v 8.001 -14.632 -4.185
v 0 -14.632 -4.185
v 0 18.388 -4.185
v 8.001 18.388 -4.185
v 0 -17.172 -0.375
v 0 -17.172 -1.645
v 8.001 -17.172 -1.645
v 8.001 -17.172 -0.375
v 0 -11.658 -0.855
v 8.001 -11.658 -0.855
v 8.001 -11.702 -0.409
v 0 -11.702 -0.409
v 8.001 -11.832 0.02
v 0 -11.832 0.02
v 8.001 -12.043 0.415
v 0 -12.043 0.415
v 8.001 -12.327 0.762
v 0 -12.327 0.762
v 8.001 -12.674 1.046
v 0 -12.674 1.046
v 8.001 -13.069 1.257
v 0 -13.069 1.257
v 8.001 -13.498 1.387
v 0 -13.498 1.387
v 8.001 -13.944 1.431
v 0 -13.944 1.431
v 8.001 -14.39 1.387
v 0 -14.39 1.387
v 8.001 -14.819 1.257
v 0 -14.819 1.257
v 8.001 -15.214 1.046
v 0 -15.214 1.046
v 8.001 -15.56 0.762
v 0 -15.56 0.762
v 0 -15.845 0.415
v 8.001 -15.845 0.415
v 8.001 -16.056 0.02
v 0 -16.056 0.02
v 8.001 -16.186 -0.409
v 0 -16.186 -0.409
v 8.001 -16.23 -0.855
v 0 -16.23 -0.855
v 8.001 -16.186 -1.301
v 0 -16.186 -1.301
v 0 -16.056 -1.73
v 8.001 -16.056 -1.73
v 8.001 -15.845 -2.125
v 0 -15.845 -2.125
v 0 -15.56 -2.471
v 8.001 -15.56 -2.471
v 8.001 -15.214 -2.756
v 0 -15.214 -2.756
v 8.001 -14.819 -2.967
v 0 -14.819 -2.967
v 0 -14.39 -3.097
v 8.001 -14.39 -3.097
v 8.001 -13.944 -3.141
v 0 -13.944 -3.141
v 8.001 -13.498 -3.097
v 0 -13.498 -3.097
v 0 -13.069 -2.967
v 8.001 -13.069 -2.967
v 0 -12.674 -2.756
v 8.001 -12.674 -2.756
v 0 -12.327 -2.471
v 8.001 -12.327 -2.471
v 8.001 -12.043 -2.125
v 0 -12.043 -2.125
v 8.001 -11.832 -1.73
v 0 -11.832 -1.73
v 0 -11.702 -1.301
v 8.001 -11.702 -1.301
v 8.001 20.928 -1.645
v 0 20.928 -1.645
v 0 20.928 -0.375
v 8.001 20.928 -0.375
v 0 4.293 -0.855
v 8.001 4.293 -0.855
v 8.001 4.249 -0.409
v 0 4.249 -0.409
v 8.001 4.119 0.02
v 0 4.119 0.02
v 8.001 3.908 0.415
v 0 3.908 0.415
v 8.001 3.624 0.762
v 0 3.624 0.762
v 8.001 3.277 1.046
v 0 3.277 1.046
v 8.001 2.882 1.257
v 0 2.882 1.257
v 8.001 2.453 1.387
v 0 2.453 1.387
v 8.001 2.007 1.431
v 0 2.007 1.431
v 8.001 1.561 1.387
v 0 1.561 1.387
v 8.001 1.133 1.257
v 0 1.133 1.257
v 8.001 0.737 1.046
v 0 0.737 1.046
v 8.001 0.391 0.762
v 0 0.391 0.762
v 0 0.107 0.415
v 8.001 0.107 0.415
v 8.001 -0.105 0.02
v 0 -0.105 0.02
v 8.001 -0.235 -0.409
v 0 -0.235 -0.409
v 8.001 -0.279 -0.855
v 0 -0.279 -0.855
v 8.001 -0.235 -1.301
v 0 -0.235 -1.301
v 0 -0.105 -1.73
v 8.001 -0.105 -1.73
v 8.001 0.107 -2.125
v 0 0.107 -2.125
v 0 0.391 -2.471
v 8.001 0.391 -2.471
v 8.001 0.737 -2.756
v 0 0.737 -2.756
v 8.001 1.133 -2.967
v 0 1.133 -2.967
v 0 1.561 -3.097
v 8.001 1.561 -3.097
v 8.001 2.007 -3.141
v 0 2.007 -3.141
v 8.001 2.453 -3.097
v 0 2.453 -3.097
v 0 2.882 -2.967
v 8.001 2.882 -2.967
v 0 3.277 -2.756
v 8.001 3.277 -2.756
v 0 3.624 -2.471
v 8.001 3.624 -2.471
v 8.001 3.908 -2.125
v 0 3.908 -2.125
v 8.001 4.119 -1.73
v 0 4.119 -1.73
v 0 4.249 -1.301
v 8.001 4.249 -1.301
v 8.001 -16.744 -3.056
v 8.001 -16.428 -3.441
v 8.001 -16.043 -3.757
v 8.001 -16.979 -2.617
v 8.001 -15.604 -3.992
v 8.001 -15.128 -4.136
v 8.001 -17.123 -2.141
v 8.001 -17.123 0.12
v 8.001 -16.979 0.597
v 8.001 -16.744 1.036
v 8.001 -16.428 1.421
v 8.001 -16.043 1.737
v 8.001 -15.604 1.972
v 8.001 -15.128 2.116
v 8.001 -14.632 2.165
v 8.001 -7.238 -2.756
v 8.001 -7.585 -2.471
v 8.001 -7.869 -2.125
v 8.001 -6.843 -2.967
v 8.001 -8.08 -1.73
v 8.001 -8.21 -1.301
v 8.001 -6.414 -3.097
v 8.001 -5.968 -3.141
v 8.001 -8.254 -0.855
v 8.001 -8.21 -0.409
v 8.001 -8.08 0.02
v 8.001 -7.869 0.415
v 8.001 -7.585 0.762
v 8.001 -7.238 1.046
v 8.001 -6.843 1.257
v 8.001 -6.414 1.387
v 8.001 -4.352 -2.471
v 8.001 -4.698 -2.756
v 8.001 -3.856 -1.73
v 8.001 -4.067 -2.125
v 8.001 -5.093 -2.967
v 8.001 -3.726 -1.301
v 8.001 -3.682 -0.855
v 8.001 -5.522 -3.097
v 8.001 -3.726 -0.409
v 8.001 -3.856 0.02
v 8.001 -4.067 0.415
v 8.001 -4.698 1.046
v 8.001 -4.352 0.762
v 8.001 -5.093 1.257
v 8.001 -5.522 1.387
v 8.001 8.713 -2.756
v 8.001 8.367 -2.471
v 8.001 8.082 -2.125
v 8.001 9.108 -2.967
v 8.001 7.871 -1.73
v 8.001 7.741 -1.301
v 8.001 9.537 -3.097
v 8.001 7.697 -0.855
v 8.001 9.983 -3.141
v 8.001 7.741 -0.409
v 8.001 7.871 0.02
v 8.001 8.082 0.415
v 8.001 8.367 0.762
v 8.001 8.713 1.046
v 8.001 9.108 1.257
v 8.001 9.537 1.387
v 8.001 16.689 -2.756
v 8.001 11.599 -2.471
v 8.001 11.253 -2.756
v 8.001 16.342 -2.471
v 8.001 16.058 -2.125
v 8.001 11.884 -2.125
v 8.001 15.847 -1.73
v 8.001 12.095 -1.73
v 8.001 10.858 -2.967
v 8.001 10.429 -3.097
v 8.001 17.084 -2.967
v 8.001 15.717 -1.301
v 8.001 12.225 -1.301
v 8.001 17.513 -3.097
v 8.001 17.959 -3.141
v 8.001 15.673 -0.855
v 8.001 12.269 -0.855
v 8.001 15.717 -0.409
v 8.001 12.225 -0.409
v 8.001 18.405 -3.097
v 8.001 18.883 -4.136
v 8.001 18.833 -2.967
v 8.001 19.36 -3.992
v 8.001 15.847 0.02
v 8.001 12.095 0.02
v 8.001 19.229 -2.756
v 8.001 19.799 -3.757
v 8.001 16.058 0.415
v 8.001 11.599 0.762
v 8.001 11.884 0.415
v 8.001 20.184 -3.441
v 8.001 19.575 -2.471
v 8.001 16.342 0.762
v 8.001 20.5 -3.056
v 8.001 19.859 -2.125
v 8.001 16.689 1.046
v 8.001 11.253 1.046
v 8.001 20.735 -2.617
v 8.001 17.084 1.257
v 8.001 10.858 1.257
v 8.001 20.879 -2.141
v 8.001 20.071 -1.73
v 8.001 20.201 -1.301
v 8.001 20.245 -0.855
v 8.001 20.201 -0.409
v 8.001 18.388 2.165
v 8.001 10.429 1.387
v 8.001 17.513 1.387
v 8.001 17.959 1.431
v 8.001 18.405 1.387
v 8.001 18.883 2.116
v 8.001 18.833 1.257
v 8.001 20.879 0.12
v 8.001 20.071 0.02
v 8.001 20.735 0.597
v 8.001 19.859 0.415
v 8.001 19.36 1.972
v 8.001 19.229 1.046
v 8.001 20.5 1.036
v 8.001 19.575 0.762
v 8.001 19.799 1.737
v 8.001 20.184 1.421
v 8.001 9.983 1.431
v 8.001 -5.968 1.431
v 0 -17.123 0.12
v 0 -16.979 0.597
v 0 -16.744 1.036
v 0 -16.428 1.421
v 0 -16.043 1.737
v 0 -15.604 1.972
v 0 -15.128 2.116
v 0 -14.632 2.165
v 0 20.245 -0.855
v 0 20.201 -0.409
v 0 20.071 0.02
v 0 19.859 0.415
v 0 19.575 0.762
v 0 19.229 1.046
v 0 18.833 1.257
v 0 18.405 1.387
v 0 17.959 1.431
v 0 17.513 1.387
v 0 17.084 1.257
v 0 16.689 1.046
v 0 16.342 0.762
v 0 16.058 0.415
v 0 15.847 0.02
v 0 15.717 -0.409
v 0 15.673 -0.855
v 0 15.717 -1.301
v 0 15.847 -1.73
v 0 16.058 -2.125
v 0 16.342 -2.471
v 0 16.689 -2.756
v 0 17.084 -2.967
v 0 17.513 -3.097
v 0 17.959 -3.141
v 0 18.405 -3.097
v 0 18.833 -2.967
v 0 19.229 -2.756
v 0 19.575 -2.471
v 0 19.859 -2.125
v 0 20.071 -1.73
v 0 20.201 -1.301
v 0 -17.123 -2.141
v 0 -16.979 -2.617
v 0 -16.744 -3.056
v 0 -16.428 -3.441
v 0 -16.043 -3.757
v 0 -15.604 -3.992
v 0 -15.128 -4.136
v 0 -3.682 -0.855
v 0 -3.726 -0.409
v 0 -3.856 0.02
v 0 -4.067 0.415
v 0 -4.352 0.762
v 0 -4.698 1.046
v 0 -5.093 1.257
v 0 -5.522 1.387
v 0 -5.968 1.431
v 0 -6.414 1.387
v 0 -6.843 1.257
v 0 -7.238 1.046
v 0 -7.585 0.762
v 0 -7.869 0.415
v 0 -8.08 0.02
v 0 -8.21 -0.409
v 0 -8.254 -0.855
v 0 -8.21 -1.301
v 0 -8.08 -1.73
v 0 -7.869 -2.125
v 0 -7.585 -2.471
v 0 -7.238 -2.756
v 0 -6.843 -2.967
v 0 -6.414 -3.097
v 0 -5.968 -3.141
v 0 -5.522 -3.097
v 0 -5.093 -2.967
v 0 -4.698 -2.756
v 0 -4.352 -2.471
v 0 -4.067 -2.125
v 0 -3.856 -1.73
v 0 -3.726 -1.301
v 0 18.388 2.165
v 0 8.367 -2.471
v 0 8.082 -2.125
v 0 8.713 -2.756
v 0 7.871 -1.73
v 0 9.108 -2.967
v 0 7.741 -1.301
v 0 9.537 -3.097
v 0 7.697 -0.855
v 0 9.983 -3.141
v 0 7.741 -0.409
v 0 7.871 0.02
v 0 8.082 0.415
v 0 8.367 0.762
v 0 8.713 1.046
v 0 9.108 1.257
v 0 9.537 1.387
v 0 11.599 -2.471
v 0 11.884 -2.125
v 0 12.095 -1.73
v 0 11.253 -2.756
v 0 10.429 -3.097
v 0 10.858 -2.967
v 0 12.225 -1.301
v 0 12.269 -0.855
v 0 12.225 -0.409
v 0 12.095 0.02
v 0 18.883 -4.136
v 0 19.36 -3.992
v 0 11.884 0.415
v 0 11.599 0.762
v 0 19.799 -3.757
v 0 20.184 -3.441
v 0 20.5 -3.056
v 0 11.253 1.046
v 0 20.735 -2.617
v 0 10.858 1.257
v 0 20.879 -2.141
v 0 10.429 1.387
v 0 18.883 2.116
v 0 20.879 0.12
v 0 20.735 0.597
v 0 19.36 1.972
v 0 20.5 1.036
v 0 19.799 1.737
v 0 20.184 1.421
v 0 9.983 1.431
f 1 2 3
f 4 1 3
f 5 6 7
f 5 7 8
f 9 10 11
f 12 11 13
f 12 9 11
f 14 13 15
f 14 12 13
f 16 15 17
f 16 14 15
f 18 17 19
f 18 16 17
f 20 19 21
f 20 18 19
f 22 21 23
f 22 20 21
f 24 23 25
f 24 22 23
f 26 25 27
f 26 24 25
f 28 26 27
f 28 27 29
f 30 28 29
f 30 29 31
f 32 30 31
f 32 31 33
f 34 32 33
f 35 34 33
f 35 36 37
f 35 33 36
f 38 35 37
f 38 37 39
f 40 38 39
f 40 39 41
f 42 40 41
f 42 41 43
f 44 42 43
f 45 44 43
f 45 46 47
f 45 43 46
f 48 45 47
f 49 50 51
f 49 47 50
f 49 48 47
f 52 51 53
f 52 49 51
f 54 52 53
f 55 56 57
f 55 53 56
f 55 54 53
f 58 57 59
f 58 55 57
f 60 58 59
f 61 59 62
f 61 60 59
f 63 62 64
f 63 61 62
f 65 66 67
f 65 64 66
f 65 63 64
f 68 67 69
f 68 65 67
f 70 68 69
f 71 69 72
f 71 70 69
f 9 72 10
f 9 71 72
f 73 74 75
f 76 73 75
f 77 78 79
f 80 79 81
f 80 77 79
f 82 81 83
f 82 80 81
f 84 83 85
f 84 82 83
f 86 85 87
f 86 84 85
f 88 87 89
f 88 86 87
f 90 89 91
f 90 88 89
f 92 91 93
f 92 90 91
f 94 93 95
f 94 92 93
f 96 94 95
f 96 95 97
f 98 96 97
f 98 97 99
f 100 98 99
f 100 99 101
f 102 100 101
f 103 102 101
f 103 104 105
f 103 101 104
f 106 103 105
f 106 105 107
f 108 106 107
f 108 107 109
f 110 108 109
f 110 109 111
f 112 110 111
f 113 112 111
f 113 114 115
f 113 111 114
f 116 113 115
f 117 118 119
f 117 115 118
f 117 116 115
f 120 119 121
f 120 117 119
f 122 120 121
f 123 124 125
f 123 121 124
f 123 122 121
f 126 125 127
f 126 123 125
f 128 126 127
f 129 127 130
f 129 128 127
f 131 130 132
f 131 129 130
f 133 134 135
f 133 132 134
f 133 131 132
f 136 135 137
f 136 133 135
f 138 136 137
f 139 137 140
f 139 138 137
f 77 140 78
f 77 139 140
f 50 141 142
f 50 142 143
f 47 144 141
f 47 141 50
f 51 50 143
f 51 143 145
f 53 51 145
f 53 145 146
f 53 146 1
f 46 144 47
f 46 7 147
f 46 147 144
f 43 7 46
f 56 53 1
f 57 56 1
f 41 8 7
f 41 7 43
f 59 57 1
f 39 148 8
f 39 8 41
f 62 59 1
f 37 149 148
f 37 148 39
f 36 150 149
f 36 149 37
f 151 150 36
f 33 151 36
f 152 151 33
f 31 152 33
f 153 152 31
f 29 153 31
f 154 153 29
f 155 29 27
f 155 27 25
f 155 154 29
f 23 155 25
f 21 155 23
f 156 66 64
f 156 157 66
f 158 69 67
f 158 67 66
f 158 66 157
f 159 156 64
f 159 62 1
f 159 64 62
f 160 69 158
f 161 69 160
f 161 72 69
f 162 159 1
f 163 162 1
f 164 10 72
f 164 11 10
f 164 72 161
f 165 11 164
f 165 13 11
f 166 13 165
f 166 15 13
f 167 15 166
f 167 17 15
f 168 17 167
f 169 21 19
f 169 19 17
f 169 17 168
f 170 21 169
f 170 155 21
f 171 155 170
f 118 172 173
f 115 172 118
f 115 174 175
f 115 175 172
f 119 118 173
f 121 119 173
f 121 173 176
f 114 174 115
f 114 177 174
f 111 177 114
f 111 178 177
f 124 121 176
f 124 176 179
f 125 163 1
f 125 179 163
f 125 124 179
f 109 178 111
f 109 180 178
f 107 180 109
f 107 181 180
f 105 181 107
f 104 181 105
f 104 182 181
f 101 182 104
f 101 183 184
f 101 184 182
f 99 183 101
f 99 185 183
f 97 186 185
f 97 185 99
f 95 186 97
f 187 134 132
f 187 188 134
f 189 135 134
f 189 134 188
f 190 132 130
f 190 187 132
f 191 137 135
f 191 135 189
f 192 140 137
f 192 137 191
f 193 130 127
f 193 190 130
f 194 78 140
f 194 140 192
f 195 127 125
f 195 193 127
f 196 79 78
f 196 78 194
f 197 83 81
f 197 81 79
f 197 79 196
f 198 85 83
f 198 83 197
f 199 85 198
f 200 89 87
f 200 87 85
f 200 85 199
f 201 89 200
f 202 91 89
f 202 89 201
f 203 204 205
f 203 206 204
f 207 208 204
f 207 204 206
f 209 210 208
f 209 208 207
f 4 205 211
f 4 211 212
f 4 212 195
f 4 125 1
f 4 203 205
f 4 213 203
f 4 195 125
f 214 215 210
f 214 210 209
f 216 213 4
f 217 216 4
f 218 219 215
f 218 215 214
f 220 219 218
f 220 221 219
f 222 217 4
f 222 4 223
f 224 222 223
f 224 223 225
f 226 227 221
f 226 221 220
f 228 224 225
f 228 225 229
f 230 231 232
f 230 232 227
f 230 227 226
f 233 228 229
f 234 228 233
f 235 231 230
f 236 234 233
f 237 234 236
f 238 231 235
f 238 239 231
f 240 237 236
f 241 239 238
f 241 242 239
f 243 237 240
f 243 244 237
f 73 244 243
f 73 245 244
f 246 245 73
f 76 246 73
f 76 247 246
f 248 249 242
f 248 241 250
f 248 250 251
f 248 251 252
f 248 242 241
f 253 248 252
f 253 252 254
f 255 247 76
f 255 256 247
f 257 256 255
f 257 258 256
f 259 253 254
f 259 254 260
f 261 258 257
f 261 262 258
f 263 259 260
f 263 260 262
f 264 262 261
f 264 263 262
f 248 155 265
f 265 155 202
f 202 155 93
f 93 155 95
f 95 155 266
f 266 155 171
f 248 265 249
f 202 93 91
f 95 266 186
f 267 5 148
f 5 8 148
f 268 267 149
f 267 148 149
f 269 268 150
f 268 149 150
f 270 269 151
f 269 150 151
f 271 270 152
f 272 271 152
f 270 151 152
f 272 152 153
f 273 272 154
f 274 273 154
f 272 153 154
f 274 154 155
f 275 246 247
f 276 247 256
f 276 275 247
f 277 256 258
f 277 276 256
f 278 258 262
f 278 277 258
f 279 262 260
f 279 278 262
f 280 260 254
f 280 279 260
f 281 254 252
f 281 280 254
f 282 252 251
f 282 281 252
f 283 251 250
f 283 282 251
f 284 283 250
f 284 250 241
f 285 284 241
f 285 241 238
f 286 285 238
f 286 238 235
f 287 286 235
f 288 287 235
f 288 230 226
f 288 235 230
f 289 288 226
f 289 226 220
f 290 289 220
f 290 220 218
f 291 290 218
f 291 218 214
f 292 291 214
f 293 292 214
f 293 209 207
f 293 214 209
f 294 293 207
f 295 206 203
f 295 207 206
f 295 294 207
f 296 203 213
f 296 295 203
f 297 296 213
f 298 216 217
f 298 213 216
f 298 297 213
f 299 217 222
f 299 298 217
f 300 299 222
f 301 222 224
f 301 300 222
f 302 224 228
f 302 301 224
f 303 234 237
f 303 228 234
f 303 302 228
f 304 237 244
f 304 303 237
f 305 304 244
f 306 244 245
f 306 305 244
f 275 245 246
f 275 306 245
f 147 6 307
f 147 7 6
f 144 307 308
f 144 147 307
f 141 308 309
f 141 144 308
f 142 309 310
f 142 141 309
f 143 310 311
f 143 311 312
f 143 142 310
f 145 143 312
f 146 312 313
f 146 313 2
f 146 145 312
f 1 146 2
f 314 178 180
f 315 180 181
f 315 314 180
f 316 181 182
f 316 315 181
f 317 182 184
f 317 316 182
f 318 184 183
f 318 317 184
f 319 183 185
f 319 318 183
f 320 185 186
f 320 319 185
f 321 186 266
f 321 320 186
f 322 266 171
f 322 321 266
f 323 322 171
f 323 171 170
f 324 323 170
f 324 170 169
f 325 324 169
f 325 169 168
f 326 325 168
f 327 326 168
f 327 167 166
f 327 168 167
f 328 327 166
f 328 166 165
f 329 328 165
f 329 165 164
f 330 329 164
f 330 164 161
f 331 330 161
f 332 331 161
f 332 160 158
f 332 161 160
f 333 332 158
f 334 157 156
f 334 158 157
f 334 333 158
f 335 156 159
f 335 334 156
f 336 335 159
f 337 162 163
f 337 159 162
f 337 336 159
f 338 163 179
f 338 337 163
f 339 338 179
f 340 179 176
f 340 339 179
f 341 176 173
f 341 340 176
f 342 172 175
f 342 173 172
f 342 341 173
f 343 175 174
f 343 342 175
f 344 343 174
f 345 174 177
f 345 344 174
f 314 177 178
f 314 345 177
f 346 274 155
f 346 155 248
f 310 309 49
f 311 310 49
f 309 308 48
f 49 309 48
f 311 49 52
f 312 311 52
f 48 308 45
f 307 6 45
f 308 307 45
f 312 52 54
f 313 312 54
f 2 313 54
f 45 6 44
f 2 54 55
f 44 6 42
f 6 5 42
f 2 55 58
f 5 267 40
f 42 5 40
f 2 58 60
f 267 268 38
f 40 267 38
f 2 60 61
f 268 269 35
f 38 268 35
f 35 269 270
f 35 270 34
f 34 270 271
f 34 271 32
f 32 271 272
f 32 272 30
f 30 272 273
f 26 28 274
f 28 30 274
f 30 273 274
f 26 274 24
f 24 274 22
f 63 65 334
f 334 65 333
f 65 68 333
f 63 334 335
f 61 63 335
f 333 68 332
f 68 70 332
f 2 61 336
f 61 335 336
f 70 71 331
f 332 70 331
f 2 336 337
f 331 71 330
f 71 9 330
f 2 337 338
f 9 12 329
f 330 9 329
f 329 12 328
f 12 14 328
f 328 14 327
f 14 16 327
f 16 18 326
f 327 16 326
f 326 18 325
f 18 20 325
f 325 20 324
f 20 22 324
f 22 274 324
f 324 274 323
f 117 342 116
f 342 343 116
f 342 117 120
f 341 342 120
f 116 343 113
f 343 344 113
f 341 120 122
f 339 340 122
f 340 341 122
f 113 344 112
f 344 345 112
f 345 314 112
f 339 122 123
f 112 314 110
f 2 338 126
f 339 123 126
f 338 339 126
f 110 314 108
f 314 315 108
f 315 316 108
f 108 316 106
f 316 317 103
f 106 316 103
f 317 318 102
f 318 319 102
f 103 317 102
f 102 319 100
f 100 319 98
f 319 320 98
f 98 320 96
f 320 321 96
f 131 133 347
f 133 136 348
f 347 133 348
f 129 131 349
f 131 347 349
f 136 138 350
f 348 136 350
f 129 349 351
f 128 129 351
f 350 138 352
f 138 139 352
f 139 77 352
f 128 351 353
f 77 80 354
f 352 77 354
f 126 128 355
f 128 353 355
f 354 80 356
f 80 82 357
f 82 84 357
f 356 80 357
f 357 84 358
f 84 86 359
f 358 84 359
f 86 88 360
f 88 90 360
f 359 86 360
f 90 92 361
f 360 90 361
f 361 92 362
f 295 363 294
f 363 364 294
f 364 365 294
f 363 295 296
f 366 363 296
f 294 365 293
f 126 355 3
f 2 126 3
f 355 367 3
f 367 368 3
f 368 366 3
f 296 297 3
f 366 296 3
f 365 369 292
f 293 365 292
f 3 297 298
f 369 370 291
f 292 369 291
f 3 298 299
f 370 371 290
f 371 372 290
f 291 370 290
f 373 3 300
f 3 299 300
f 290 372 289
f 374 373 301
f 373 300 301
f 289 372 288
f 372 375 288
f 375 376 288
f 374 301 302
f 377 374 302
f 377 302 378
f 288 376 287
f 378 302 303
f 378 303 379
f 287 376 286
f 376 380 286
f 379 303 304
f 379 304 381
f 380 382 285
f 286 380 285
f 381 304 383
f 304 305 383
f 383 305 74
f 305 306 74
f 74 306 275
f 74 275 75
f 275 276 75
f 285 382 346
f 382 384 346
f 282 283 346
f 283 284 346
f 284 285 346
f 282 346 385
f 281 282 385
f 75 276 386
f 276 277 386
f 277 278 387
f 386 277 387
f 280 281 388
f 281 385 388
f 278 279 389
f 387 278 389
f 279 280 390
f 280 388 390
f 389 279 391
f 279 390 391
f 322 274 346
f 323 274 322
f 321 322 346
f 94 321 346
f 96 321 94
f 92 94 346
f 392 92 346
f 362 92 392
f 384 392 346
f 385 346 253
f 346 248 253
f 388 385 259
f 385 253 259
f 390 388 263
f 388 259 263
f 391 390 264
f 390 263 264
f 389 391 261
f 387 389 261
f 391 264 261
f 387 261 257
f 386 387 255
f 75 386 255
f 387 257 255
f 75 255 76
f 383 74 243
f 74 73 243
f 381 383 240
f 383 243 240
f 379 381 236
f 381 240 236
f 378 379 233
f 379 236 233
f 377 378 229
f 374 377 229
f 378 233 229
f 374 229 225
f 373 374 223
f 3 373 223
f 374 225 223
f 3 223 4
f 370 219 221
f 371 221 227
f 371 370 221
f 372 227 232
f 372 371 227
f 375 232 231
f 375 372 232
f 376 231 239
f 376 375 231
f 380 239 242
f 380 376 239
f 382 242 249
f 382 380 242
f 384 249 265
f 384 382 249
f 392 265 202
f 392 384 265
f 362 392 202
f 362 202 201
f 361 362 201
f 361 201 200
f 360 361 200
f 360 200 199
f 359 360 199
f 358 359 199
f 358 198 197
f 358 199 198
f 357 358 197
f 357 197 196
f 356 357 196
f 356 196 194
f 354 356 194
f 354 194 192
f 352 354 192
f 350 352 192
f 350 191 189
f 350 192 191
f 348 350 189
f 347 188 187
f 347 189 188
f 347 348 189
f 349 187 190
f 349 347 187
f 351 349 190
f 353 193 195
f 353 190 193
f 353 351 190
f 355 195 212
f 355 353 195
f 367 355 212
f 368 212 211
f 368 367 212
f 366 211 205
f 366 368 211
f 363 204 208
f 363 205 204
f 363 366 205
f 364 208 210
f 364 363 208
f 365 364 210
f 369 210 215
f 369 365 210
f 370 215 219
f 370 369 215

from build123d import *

# Parameters (mm, degrees)
F0_W     = 38.1
F0_H     = 6.35
F2_DEPTH = 8.001
F1_R     = 2.286
F3_DEPTH = 25.4
F4_R     = 2.54
F5_R     = 2.54
F6_R     = 2.54
F7_R     = 2.54


with BuildPart() as f2:
    # F0 (on Right) → F2 (new body)
    with BuildSketch(Plane.YZ):
        with Locations((1.877956, -1.010046)):
            Rectangle(F0_W, F0_H)
    extrude(amount=F2_DEPTH)

    # F1 (on face) → F3 (cut)
    with BuildSketch(Plane.YZ):
        with Locations((-13.943814, -0.854794)):
            Circle(F1_R)
        with Locations((-5.968214, -0.854794)):
            Circle(F1_R)
        with Locations((2.007386, -0.854794)):
            Circle(F1_R)
        with Locations((9.982986, -0.854794)):
            Circle(F1_R)
        with Locations((17.958586, -0.854794)):
            Circle(F1_R)
    extrude(amount=F3_DEPTH, mode=Mode.SUBTRACT)

    # F4
    f4_edges = [f2.edges().sort_by_distance(p)[0] for p in [
        (4.0005, -17.172044, 2.164954),
    ]]
    fillet(f4_edges, radius=F4_R)

    # F5
    f5_edges = [f2.edges().sort_by_distance(p)[0] for p in [
        (4.0005, -17.172044, -4.185046),
    ]]
    fillet(f5_edges, radius=F5_R)

    # F6
    f6_edges = [f2.edges().sort_by_distance(p)[0] for p in [
        (4.0005, 20.927956, 2.164954),
    ]]
    fillet(f6_edges, radius=F6_R)

    # F7
    f7_edges = [f2.edges().sort_by_distance(p)[0] for p in [
        (4.0005, 20.927956, -4.185046),
    ]]
    fillet(f7_edges, radius=F7_R)


solid = f2.part
